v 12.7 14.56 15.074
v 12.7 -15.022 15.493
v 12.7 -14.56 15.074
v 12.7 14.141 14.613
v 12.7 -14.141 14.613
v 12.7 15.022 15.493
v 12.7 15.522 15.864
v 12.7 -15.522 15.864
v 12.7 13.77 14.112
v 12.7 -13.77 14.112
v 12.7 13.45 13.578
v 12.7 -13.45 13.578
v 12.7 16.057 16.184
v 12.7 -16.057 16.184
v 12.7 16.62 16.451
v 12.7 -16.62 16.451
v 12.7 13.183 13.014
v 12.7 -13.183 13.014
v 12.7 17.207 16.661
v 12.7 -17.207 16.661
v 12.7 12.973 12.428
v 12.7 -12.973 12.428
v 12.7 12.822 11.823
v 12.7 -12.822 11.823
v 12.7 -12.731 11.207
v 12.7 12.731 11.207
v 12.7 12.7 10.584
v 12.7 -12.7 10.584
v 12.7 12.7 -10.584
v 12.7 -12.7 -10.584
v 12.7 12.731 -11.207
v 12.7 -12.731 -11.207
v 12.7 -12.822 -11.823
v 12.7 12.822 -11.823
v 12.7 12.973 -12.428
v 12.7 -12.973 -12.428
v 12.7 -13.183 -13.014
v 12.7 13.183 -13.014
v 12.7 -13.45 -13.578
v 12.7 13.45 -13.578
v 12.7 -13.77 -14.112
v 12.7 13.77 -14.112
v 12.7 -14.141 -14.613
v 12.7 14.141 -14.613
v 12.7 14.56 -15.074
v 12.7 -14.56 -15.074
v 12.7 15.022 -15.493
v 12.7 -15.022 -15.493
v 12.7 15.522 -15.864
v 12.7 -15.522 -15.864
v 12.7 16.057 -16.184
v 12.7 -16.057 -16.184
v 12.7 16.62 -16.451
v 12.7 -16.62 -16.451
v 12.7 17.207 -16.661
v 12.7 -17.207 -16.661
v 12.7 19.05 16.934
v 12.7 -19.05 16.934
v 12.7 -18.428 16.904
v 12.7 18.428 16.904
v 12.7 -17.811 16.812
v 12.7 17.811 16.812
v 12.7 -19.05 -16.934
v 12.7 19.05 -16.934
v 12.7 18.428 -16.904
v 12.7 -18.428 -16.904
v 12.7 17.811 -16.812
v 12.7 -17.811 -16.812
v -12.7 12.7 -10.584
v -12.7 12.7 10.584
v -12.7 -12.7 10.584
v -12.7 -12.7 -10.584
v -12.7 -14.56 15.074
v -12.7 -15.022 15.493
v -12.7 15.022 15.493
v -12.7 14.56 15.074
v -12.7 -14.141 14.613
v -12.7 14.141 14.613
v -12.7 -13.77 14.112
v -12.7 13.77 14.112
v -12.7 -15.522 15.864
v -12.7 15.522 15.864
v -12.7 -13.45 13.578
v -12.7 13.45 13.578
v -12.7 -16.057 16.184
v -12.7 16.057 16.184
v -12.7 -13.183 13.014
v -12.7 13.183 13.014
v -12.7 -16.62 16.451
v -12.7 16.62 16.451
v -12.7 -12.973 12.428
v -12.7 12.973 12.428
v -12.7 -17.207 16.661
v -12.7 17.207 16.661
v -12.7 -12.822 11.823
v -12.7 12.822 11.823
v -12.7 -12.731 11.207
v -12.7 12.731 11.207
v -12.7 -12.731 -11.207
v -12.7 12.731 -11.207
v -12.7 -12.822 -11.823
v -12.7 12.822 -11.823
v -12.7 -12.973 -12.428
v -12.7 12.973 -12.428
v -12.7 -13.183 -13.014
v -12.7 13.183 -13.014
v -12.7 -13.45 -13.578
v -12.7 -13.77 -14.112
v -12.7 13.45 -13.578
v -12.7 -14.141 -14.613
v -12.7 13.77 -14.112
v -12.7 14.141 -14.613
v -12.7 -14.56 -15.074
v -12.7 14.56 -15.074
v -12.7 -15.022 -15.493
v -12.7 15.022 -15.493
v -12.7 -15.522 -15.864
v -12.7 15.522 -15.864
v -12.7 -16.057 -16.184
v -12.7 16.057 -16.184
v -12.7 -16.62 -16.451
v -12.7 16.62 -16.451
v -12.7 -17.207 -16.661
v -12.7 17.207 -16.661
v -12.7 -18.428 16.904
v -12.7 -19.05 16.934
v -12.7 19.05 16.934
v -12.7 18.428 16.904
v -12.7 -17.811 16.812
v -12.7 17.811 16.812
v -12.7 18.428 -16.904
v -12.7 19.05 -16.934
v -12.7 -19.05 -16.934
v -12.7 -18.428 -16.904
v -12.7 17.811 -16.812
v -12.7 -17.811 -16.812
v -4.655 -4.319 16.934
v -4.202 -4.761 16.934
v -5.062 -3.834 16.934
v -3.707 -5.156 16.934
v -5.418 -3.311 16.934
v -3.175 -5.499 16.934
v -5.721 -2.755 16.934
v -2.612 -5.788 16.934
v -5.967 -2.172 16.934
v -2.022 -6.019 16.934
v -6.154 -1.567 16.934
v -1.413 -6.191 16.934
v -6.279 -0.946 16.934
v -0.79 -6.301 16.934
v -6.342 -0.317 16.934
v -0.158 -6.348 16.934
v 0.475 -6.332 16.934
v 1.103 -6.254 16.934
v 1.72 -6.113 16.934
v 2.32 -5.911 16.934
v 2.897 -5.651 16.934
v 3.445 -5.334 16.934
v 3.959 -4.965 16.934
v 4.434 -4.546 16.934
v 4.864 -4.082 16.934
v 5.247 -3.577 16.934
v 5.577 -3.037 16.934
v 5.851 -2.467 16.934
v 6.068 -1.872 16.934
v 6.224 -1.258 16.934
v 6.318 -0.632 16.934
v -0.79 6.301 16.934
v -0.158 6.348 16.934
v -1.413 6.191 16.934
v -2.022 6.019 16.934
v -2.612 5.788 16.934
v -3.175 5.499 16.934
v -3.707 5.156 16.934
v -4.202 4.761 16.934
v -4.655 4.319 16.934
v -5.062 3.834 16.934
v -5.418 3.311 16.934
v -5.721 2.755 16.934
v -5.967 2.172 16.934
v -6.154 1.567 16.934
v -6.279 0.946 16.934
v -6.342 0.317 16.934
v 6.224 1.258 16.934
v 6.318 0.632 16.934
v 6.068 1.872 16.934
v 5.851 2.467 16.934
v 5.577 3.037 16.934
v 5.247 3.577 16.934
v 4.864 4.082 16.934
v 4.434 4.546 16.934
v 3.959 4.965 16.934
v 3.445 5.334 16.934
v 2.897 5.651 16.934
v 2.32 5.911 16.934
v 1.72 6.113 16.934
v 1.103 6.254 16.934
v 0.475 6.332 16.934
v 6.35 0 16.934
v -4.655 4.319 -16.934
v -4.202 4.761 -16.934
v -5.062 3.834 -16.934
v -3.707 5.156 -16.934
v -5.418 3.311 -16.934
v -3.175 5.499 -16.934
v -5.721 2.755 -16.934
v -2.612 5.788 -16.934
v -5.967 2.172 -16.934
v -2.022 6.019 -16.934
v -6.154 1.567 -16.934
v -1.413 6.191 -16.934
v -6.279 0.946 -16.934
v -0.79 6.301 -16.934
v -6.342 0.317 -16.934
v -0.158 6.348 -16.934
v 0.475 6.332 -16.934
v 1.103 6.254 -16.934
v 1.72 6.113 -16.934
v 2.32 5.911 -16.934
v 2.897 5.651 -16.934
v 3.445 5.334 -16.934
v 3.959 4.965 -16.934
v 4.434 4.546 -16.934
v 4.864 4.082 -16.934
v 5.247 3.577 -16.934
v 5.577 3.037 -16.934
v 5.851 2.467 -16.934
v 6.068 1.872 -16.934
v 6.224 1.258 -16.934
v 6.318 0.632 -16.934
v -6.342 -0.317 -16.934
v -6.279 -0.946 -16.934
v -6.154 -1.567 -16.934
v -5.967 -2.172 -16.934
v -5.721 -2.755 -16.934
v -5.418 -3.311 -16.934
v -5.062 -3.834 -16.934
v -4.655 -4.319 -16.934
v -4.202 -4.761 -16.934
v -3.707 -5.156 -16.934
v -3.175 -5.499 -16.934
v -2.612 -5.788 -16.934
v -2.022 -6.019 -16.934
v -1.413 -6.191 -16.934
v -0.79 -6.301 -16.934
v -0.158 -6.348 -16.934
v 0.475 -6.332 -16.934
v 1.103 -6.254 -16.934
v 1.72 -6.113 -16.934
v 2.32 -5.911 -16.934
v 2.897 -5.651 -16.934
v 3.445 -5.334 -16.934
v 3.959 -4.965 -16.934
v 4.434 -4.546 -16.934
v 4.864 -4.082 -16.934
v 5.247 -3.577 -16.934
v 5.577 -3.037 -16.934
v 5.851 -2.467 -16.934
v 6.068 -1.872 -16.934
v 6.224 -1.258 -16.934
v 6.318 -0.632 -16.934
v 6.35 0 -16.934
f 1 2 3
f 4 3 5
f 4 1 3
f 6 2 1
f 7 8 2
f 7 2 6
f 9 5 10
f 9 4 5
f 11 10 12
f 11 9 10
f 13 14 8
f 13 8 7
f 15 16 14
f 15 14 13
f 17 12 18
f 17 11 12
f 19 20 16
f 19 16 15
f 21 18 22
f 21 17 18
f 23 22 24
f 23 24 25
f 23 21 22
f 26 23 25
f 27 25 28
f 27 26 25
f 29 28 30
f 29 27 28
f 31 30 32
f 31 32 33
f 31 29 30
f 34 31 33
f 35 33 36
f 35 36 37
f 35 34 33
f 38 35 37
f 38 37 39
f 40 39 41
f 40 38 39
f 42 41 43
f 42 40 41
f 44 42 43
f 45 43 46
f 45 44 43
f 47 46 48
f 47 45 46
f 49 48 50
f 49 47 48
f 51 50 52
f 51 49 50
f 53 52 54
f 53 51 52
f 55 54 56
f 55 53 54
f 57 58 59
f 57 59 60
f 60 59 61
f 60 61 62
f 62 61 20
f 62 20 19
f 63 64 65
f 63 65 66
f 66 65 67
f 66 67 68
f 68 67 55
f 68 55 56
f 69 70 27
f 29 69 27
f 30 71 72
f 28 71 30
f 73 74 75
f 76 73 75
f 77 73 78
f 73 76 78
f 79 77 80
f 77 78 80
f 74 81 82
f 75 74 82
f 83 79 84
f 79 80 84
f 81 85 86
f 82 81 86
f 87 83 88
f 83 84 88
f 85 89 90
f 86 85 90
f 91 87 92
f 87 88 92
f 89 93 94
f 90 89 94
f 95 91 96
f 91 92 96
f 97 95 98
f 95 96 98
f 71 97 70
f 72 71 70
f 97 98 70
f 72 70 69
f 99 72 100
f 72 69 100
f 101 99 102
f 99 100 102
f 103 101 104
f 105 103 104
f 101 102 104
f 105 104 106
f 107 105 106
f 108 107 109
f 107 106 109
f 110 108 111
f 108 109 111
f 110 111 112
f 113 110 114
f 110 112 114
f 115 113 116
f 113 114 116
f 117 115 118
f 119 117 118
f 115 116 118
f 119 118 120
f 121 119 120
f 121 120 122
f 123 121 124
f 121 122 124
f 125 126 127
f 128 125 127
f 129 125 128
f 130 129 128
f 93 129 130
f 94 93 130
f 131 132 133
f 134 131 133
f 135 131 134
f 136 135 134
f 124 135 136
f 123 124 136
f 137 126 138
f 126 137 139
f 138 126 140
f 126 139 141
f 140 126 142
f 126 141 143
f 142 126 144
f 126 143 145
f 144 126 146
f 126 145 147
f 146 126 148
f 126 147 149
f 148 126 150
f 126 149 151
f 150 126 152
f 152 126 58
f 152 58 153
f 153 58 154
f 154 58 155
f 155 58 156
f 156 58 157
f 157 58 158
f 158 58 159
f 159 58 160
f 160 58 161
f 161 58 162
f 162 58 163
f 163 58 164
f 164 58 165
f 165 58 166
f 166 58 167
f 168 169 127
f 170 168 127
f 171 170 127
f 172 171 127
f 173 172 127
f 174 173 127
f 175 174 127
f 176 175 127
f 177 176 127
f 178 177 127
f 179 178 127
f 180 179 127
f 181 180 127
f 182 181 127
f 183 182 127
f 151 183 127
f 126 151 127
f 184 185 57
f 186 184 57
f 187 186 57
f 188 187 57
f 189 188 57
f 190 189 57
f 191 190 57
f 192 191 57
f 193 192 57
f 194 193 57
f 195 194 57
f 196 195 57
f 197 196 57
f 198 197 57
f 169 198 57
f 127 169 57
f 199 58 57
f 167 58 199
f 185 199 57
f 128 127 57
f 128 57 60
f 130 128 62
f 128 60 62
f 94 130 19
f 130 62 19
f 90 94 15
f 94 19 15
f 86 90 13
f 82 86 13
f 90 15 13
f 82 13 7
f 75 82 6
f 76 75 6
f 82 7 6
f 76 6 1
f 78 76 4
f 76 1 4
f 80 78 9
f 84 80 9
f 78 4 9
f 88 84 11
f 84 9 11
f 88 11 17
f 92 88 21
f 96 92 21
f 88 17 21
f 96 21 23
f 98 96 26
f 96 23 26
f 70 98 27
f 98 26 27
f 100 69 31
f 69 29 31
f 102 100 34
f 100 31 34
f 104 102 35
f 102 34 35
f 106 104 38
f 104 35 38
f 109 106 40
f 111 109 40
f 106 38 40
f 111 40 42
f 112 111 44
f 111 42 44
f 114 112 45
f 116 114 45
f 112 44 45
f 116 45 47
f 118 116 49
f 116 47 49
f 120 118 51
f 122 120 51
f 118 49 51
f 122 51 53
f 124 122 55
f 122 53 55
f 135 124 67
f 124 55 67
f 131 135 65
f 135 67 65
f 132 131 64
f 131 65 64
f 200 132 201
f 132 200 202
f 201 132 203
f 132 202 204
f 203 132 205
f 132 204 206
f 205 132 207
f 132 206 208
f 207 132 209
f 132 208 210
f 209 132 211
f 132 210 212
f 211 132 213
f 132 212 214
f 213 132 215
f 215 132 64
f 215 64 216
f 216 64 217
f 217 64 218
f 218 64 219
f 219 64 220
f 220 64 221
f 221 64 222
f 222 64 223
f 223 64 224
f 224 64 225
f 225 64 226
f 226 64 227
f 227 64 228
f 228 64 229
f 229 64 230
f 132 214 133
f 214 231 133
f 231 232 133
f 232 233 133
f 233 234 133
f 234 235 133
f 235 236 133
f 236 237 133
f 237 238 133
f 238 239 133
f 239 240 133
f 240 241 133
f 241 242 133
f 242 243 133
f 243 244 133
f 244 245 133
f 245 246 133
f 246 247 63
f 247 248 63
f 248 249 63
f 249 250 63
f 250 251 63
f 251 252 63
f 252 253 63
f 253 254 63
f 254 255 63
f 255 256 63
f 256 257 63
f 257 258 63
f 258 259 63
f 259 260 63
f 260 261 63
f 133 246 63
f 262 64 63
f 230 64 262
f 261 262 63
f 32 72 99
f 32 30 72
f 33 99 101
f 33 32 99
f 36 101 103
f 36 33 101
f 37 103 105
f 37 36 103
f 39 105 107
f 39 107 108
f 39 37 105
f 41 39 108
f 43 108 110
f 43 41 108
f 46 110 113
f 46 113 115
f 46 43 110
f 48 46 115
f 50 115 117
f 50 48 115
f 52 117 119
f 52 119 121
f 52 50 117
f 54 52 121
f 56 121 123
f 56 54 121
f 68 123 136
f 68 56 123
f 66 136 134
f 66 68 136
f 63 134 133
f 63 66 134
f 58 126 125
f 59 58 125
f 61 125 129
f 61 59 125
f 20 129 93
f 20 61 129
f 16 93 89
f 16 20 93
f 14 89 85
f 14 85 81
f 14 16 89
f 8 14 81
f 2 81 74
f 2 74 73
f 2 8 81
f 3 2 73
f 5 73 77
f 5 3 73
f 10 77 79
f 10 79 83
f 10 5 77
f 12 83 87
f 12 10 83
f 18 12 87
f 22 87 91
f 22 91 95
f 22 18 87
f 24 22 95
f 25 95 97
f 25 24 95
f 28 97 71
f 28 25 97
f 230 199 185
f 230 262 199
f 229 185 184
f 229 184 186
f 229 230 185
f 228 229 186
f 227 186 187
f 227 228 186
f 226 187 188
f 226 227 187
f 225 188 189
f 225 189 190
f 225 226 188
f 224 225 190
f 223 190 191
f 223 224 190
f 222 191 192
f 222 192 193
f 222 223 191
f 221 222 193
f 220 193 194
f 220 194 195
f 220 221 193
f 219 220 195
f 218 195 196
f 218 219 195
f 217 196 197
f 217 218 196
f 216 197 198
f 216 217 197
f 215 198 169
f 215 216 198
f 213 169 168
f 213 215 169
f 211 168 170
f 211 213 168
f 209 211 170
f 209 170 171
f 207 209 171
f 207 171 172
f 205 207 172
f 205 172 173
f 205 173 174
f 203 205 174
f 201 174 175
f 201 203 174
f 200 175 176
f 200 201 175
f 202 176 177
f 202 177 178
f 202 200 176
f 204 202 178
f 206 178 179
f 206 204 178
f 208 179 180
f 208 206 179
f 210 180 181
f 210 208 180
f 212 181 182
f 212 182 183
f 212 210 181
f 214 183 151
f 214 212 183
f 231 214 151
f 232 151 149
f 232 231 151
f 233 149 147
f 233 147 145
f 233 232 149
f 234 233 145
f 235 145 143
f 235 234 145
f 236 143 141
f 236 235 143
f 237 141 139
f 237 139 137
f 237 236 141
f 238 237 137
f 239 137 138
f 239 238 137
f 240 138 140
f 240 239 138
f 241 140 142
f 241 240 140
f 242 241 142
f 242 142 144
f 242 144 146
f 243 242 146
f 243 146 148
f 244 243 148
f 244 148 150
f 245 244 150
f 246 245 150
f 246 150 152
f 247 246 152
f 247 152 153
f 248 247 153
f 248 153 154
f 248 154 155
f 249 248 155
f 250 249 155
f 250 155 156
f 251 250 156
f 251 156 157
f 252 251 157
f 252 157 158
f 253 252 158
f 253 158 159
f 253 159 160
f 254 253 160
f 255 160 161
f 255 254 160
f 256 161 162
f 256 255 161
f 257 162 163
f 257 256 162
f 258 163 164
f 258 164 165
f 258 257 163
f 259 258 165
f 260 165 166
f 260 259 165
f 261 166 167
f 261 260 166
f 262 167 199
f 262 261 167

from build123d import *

# Parameters (mm, degrees)
SKETCH1_W           = 25.4
SKETCH1_H           = 25.4
SKETCH1_R           = 6.35
BOSS_EXTRUDE1_DEPTH = 16.93418
BOSS_EXTRUDE2_DEPTH = 25.4
FILLET1_R           = 6.35
CUT_EXTRUDE1_DEPTH  = 39.338661357


with BuildPart() as part:
    # Sketch1 → Boss-Extrude1 (new, symmetric)
    with BuildSketch(Plane.XY):
        Rectangle(SKETCH1_W, SKETCH1_H)
        Circle(SKETCH1_R, mode=Mode.SUBTRACT)
    extrude(amount=BOSS_EXTRUDE1_DEPTH, both=True)

    # Sketch3 → Boss-Extrude2 (add)
    with BuildSketch(Plane(origin=(12.7, 0, 0), x_dir=(0, 0, -1), z_dir=(1, 0, 0))):
        Polygon((-16.93418, -12.7), (-16.93418, 12.7), (-16.93418, 19.05), (-21.489310241, 19.05), (-21.489310241, -19.05), (-16.93418, -19.05), align=None)
        Polygon((16.93418, -12.7), (16.93418, 12.7), (16.93418, 19.05), (21.489310241, 19.05), (21.489310241, -19.05), (16.93418, -19.05), align=None)
    extrude(amount=-BOSS_EXTRUDE2_DEPTH)

    # Fillet1
    fillet1_edges = [part.edges().sort_by_distance(p)[0] for p in [
        (0, -12.7, -16.93418),
        (0, -12.7, 16.93418),
        (0, 12.7, 16.93418),
        (0, 12.7, -16.93418),
    ]]
    fillet(fillet1_edges, radius=FILLET1_R - 0.0001)  # a hair under: the kernel refuses the full size

    # Sketch3<2> → Cut-Extrude1 (cut, through all)
    with BuildSketch(Plane(origin=(12.7, 0, 0), x_dir=(0, 0, -1), z_dir=(1, 0, 0))):
        Polygon((-16.93418, -12.7), (-16.93418, 12.7), (-16.93418, 19.05), (-21.489310241, 19.05), (-21.489310241, -19.05), (-16.93418, -19.05), align=None)
        Polygon((16.93418, -12.7), (16.93418, 12.7), (16.93418, 19.05), (21.489310241, 19.05), (21.489310241, -19.05), (16.93418, -19.05), align=None)
    extrude(amount=-CUT_EXTRUDE1_DEPTH, mode=Mode.SUBTRACT)


solid = part.part
